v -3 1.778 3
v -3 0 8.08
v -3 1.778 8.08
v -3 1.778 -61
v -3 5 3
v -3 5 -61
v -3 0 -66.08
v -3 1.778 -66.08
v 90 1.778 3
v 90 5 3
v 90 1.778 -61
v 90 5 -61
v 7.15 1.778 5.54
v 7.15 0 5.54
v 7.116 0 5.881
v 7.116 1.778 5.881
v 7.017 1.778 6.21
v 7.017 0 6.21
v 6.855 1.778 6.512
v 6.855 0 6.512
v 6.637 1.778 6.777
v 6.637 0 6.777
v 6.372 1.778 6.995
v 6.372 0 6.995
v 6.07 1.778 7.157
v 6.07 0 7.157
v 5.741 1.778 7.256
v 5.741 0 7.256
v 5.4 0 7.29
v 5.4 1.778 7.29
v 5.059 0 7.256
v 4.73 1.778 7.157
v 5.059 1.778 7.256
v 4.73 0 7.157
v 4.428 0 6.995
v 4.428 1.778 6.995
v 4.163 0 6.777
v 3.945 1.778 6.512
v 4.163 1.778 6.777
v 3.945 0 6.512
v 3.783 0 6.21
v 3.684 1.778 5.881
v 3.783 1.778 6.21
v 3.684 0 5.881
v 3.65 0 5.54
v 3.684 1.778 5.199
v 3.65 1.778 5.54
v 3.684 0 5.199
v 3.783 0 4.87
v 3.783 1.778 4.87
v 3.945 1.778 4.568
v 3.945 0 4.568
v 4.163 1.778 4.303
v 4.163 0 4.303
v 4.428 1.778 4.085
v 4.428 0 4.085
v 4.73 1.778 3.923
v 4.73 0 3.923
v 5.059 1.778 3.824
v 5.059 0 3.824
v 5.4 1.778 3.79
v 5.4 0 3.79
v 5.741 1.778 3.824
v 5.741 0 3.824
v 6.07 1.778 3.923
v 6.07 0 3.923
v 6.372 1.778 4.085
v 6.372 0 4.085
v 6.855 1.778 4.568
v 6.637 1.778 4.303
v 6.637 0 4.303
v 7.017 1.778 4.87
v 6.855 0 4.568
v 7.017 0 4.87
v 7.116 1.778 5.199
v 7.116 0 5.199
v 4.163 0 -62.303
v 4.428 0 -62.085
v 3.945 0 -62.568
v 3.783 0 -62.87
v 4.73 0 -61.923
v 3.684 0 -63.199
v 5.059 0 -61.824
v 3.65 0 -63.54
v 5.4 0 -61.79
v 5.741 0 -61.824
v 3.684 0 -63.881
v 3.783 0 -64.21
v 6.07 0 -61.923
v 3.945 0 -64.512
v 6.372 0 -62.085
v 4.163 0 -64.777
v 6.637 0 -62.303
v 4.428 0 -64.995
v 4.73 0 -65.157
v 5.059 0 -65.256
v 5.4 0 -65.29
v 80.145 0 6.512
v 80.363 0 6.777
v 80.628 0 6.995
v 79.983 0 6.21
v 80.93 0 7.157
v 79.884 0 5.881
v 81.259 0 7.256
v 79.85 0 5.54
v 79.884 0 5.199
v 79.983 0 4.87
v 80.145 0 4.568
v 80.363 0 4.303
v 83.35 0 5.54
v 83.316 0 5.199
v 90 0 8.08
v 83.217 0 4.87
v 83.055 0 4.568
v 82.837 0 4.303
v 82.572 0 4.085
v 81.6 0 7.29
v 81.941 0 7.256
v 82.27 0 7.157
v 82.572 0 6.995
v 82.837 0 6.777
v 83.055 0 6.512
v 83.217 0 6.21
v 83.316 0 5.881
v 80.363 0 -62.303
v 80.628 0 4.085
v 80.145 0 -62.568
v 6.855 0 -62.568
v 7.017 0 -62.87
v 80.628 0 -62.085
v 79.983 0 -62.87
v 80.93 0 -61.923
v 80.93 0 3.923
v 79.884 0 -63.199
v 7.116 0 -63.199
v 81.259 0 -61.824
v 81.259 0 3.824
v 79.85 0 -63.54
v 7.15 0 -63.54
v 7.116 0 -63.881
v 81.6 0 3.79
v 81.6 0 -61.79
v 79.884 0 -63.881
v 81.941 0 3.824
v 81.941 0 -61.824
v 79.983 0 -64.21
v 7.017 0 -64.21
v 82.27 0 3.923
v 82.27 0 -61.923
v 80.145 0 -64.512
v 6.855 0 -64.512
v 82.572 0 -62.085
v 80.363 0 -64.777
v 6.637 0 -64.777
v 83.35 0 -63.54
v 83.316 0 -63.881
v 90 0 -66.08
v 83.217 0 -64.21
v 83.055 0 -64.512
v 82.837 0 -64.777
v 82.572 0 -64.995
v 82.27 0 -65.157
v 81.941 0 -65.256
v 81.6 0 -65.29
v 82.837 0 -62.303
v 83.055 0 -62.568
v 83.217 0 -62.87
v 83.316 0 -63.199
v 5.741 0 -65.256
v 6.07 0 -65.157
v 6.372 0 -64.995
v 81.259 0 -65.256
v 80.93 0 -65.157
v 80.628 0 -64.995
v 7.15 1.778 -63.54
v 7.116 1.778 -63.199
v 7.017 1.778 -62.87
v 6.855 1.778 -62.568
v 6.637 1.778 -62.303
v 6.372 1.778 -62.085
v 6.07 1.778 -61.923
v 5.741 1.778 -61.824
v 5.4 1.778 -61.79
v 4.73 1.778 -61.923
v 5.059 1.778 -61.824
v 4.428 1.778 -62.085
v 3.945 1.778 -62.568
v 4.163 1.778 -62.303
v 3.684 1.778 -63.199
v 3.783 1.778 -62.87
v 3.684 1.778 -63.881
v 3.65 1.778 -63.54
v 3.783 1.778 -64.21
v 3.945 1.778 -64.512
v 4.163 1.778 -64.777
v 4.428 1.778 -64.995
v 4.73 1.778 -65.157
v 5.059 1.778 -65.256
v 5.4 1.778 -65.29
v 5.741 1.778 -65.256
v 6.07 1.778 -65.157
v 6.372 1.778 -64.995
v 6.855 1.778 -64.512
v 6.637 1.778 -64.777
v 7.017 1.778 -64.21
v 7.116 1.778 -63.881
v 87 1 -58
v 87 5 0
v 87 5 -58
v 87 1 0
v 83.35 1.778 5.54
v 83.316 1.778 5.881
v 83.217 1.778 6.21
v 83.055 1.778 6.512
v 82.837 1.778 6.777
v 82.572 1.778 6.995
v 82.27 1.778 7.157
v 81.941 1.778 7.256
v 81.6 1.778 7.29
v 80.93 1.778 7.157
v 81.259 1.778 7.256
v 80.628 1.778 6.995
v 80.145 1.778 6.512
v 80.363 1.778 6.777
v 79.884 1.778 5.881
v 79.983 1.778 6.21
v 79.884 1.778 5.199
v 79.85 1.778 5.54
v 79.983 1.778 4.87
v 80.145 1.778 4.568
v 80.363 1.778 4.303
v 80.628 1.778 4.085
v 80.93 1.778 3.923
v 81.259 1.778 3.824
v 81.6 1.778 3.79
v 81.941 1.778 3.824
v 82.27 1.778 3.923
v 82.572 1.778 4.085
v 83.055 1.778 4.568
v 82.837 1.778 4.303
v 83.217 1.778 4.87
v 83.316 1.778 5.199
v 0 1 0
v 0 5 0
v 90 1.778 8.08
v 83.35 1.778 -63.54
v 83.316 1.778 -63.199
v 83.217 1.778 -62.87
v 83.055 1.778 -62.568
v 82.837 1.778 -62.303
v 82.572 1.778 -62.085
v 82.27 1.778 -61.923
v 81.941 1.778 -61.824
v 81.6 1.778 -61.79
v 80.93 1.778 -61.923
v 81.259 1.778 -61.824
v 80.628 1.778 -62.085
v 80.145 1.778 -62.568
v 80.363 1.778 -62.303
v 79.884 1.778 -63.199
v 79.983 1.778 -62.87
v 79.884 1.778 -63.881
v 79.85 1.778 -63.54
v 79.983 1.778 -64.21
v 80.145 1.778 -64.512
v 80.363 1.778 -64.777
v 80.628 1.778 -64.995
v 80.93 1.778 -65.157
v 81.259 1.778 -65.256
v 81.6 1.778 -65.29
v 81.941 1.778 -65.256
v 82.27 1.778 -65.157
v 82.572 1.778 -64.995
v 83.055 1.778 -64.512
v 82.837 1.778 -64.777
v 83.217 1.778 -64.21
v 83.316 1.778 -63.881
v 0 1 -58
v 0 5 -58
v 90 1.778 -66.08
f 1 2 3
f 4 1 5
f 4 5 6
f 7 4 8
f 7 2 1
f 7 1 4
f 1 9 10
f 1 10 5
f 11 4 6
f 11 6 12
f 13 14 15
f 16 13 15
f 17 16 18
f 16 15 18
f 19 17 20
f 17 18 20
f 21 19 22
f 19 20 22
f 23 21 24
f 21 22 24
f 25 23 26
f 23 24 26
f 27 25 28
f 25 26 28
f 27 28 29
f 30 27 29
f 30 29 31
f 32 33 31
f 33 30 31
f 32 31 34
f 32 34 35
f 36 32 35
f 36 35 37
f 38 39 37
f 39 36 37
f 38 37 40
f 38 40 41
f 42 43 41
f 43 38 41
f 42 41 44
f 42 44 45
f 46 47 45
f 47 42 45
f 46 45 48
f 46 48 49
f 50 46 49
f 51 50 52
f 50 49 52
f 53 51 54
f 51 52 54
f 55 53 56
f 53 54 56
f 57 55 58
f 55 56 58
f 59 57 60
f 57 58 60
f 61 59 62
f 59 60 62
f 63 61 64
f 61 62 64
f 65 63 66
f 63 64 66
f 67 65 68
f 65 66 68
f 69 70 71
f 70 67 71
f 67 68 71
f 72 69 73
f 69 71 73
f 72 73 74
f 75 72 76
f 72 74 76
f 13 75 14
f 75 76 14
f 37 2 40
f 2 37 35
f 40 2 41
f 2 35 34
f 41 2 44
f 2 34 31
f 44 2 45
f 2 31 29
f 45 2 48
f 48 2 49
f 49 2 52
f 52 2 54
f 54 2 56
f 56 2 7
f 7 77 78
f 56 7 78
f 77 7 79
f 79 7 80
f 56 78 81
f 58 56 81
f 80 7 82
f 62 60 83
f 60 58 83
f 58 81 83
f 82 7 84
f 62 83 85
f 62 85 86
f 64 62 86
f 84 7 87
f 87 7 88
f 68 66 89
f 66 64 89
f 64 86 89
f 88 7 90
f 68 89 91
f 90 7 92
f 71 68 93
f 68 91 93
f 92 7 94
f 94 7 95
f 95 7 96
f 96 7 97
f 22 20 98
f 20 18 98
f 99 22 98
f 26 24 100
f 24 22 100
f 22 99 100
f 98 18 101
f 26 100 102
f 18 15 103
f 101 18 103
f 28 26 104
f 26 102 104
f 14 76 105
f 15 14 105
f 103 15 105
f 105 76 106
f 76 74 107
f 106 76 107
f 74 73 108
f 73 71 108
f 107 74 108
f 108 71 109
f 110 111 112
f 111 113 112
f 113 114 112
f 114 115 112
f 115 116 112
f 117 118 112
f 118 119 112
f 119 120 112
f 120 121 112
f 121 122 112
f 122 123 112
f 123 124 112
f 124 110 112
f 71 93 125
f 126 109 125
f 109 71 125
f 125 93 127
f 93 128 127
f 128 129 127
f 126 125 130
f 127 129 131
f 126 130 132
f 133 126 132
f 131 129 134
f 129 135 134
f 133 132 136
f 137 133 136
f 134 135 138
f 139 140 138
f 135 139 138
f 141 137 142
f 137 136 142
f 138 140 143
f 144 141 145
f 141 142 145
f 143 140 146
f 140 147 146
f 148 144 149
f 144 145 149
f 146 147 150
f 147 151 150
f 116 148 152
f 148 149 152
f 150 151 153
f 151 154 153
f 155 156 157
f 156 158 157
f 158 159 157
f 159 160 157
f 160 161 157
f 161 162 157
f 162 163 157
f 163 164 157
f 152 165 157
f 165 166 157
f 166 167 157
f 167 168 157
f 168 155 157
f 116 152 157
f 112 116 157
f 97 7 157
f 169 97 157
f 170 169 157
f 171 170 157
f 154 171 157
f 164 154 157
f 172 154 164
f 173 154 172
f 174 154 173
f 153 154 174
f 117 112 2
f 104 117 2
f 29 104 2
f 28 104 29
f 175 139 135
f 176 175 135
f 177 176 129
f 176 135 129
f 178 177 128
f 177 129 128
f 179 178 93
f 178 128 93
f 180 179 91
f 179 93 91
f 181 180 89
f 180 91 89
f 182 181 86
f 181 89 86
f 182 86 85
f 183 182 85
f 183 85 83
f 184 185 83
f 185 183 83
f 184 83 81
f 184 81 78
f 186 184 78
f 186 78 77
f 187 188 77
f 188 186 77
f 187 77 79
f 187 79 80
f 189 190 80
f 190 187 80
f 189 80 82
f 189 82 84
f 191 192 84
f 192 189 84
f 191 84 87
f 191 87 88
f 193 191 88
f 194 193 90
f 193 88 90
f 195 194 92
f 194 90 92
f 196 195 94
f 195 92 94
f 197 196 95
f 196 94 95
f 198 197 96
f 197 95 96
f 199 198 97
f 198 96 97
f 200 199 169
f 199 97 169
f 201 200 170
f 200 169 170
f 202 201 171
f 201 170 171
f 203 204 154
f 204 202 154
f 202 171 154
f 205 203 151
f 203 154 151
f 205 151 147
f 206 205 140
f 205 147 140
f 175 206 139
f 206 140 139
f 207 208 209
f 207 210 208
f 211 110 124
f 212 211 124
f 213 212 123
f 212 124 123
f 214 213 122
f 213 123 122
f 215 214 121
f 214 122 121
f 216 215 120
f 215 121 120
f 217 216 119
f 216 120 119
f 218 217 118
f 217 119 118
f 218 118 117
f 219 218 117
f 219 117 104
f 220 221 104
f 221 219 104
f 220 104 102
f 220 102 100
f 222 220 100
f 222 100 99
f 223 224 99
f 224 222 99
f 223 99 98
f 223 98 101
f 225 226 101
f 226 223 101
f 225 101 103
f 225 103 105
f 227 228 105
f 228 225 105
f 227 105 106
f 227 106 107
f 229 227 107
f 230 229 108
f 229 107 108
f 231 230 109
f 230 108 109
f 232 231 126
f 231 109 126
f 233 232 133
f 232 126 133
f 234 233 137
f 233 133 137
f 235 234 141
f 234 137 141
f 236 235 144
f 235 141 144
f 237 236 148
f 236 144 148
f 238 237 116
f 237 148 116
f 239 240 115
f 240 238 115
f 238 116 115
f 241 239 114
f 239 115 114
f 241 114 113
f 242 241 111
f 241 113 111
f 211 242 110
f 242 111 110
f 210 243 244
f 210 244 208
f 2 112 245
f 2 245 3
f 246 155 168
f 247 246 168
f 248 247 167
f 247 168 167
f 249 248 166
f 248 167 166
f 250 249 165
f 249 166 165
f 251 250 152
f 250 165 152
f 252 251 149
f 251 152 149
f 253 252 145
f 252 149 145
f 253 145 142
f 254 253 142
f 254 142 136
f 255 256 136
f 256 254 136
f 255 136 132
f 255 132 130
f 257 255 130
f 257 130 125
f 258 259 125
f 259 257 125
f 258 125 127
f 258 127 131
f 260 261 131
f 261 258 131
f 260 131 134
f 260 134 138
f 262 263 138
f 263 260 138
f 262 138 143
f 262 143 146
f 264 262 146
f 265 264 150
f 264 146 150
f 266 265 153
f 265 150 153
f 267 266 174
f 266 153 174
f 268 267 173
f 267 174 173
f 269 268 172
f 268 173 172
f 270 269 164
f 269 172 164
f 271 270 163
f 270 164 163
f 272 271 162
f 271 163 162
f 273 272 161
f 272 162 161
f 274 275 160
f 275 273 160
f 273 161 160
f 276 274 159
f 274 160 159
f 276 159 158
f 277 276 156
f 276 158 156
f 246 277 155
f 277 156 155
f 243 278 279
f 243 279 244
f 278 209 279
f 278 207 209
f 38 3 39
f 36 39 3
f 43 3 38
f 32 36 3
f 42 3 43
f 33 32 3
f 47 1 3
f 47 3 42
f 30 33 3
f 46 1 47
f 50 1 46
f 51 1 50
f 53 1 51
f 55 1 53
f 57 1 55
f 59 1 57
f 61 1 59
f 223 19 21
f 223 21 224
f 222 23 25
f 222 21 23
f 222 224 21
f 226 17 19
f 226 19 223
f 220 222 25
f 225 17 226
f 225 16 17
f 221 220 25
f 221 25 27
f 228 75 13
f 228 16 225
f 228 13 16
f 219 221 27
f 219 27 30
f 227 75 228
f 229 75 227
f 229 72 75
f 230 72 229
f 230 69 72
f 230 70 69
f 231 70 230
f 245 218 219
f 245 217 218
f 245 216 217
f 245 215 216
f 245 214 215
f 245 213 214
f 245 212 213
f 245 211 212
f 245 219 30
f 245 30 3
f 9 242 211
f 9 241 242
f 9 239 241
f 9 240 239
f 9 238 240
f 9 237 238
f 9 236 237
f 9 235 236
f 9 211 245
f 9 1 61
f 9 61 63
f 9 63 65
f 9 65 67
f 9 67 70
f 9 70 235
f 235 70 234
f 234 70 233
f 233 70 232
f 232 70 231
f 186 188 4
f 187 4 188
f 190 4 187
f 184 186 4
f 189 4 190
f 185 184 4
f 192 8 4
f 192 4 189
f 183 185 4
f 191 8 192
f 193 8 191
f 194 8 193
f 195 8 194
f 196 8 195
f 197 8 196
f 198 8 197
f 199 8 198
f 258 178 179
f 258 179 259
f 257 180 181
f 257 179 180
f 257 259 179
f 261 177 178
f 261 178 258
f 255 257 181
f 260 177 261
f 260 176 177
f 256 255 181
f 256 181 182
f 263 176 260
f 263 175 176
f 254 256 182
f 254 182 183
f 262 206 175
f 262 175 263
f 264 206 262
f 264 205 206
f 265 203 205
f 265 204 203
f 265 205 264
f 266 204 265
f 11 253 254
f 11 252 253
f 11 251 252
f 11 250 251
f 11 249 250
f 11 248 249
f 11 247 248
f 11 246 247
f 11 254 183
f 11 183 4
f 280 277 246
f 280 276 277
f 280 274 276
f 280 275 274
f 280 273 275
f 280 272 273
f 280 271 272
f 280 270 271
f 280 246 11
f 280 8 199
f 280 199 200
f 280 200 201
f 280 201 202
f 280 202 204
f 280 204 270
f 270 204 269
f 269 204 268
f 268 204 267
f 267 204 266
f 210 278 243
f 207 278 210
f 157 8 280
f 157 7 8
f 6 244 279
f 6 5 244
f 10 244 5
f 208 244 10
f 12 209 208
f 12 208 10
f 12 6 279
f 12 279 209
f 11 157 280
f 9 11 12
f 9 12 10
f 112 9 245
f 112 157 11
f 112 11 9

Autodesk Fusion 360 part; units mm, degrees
sketch "Sketch1" plane through (0, 0, 0) normal (0, 1, 0) x (1, 0, 0)
  line L0 (0, 0) -> (87, 0)
  line L1 (87, 0) -> (87, 58)
  line L2 (87, 58) -> (0, 58)
  line L3 (0, 58) -> (0, 0)
  line L4 (-3, 61) -> (90, 61)
  line L5 (90, 61) -> (90, -3)
  line L6 (90, -3) -> (-3, -3)
  line L7 (-3, -3) -> (-3, 61)
  dimension "d1" = 87
  dimension "d2" = 58
  dimension "d3" = 3
  dimension "d4" = 3
  dimension "d5" = 3
  dimension "d6" = 3
extrude "Extrude1" add sketch "Sketch1" along normal blind 5
extrude "Extrude2" add sketch "Sketch1" along normal blind 1 contours L0 L1 L2 L3
sketch "Sketch2" plane through (0, 0, 0) normal (0, 1, 0) x (1, 0, 0)
  line L0 (90, -3) -> (-3, -3)
  line L1 (-3, -3) -> (-3, 61)
  line L2 (-3, 61) -> (90, 61)
  line L3 (90, 61) -> (90, -3)
  circle A0 centre (81.6, 63.54) radius 1.75
  circle A1 centre (5.4, 63.54) radius 1.75
  line L4 (-3, -3) -> (-3, 61)
  line L5 (-3, 61) -> (90, 61)
  circle A2 centre (81.6, -5.54) radius 1.75
  circle A3 centre (5.4, -5.54) radius 1.75
  line L6 (90, -3) -> (-3, -3)
  line L7 (-3, 66.08) -> (90, 66.08)
  line L8 (90, 66.08) -> (90, -8.08)
  line L9 (90, -8.08) -> (-3, -8.08)
  line L10 (-3, -8.08) -> (-3, 66.08)
  dimension "d11" = 3.5
  dimension "d12" = 3.5
  dimension "d13" = 76.2
  dimension "d14" = 8.4
  dimension "d15" = 2.54
  dimension "d16" = 3.5
  dimension "d17" = 3.5
  dimension "d18" = 2.54
  dimension "d19" = 2.54
  dimension "d21" = 2.54
  dimension "d22" = 2.54
extrude "Extrude3" add sketch "Sketch2" along normal blind 1.778 contours L0 L6 L8 L9 L10 | L2 L5 L7 L8 L10
equation "d4 = d3"
equation "d5 = d4"
